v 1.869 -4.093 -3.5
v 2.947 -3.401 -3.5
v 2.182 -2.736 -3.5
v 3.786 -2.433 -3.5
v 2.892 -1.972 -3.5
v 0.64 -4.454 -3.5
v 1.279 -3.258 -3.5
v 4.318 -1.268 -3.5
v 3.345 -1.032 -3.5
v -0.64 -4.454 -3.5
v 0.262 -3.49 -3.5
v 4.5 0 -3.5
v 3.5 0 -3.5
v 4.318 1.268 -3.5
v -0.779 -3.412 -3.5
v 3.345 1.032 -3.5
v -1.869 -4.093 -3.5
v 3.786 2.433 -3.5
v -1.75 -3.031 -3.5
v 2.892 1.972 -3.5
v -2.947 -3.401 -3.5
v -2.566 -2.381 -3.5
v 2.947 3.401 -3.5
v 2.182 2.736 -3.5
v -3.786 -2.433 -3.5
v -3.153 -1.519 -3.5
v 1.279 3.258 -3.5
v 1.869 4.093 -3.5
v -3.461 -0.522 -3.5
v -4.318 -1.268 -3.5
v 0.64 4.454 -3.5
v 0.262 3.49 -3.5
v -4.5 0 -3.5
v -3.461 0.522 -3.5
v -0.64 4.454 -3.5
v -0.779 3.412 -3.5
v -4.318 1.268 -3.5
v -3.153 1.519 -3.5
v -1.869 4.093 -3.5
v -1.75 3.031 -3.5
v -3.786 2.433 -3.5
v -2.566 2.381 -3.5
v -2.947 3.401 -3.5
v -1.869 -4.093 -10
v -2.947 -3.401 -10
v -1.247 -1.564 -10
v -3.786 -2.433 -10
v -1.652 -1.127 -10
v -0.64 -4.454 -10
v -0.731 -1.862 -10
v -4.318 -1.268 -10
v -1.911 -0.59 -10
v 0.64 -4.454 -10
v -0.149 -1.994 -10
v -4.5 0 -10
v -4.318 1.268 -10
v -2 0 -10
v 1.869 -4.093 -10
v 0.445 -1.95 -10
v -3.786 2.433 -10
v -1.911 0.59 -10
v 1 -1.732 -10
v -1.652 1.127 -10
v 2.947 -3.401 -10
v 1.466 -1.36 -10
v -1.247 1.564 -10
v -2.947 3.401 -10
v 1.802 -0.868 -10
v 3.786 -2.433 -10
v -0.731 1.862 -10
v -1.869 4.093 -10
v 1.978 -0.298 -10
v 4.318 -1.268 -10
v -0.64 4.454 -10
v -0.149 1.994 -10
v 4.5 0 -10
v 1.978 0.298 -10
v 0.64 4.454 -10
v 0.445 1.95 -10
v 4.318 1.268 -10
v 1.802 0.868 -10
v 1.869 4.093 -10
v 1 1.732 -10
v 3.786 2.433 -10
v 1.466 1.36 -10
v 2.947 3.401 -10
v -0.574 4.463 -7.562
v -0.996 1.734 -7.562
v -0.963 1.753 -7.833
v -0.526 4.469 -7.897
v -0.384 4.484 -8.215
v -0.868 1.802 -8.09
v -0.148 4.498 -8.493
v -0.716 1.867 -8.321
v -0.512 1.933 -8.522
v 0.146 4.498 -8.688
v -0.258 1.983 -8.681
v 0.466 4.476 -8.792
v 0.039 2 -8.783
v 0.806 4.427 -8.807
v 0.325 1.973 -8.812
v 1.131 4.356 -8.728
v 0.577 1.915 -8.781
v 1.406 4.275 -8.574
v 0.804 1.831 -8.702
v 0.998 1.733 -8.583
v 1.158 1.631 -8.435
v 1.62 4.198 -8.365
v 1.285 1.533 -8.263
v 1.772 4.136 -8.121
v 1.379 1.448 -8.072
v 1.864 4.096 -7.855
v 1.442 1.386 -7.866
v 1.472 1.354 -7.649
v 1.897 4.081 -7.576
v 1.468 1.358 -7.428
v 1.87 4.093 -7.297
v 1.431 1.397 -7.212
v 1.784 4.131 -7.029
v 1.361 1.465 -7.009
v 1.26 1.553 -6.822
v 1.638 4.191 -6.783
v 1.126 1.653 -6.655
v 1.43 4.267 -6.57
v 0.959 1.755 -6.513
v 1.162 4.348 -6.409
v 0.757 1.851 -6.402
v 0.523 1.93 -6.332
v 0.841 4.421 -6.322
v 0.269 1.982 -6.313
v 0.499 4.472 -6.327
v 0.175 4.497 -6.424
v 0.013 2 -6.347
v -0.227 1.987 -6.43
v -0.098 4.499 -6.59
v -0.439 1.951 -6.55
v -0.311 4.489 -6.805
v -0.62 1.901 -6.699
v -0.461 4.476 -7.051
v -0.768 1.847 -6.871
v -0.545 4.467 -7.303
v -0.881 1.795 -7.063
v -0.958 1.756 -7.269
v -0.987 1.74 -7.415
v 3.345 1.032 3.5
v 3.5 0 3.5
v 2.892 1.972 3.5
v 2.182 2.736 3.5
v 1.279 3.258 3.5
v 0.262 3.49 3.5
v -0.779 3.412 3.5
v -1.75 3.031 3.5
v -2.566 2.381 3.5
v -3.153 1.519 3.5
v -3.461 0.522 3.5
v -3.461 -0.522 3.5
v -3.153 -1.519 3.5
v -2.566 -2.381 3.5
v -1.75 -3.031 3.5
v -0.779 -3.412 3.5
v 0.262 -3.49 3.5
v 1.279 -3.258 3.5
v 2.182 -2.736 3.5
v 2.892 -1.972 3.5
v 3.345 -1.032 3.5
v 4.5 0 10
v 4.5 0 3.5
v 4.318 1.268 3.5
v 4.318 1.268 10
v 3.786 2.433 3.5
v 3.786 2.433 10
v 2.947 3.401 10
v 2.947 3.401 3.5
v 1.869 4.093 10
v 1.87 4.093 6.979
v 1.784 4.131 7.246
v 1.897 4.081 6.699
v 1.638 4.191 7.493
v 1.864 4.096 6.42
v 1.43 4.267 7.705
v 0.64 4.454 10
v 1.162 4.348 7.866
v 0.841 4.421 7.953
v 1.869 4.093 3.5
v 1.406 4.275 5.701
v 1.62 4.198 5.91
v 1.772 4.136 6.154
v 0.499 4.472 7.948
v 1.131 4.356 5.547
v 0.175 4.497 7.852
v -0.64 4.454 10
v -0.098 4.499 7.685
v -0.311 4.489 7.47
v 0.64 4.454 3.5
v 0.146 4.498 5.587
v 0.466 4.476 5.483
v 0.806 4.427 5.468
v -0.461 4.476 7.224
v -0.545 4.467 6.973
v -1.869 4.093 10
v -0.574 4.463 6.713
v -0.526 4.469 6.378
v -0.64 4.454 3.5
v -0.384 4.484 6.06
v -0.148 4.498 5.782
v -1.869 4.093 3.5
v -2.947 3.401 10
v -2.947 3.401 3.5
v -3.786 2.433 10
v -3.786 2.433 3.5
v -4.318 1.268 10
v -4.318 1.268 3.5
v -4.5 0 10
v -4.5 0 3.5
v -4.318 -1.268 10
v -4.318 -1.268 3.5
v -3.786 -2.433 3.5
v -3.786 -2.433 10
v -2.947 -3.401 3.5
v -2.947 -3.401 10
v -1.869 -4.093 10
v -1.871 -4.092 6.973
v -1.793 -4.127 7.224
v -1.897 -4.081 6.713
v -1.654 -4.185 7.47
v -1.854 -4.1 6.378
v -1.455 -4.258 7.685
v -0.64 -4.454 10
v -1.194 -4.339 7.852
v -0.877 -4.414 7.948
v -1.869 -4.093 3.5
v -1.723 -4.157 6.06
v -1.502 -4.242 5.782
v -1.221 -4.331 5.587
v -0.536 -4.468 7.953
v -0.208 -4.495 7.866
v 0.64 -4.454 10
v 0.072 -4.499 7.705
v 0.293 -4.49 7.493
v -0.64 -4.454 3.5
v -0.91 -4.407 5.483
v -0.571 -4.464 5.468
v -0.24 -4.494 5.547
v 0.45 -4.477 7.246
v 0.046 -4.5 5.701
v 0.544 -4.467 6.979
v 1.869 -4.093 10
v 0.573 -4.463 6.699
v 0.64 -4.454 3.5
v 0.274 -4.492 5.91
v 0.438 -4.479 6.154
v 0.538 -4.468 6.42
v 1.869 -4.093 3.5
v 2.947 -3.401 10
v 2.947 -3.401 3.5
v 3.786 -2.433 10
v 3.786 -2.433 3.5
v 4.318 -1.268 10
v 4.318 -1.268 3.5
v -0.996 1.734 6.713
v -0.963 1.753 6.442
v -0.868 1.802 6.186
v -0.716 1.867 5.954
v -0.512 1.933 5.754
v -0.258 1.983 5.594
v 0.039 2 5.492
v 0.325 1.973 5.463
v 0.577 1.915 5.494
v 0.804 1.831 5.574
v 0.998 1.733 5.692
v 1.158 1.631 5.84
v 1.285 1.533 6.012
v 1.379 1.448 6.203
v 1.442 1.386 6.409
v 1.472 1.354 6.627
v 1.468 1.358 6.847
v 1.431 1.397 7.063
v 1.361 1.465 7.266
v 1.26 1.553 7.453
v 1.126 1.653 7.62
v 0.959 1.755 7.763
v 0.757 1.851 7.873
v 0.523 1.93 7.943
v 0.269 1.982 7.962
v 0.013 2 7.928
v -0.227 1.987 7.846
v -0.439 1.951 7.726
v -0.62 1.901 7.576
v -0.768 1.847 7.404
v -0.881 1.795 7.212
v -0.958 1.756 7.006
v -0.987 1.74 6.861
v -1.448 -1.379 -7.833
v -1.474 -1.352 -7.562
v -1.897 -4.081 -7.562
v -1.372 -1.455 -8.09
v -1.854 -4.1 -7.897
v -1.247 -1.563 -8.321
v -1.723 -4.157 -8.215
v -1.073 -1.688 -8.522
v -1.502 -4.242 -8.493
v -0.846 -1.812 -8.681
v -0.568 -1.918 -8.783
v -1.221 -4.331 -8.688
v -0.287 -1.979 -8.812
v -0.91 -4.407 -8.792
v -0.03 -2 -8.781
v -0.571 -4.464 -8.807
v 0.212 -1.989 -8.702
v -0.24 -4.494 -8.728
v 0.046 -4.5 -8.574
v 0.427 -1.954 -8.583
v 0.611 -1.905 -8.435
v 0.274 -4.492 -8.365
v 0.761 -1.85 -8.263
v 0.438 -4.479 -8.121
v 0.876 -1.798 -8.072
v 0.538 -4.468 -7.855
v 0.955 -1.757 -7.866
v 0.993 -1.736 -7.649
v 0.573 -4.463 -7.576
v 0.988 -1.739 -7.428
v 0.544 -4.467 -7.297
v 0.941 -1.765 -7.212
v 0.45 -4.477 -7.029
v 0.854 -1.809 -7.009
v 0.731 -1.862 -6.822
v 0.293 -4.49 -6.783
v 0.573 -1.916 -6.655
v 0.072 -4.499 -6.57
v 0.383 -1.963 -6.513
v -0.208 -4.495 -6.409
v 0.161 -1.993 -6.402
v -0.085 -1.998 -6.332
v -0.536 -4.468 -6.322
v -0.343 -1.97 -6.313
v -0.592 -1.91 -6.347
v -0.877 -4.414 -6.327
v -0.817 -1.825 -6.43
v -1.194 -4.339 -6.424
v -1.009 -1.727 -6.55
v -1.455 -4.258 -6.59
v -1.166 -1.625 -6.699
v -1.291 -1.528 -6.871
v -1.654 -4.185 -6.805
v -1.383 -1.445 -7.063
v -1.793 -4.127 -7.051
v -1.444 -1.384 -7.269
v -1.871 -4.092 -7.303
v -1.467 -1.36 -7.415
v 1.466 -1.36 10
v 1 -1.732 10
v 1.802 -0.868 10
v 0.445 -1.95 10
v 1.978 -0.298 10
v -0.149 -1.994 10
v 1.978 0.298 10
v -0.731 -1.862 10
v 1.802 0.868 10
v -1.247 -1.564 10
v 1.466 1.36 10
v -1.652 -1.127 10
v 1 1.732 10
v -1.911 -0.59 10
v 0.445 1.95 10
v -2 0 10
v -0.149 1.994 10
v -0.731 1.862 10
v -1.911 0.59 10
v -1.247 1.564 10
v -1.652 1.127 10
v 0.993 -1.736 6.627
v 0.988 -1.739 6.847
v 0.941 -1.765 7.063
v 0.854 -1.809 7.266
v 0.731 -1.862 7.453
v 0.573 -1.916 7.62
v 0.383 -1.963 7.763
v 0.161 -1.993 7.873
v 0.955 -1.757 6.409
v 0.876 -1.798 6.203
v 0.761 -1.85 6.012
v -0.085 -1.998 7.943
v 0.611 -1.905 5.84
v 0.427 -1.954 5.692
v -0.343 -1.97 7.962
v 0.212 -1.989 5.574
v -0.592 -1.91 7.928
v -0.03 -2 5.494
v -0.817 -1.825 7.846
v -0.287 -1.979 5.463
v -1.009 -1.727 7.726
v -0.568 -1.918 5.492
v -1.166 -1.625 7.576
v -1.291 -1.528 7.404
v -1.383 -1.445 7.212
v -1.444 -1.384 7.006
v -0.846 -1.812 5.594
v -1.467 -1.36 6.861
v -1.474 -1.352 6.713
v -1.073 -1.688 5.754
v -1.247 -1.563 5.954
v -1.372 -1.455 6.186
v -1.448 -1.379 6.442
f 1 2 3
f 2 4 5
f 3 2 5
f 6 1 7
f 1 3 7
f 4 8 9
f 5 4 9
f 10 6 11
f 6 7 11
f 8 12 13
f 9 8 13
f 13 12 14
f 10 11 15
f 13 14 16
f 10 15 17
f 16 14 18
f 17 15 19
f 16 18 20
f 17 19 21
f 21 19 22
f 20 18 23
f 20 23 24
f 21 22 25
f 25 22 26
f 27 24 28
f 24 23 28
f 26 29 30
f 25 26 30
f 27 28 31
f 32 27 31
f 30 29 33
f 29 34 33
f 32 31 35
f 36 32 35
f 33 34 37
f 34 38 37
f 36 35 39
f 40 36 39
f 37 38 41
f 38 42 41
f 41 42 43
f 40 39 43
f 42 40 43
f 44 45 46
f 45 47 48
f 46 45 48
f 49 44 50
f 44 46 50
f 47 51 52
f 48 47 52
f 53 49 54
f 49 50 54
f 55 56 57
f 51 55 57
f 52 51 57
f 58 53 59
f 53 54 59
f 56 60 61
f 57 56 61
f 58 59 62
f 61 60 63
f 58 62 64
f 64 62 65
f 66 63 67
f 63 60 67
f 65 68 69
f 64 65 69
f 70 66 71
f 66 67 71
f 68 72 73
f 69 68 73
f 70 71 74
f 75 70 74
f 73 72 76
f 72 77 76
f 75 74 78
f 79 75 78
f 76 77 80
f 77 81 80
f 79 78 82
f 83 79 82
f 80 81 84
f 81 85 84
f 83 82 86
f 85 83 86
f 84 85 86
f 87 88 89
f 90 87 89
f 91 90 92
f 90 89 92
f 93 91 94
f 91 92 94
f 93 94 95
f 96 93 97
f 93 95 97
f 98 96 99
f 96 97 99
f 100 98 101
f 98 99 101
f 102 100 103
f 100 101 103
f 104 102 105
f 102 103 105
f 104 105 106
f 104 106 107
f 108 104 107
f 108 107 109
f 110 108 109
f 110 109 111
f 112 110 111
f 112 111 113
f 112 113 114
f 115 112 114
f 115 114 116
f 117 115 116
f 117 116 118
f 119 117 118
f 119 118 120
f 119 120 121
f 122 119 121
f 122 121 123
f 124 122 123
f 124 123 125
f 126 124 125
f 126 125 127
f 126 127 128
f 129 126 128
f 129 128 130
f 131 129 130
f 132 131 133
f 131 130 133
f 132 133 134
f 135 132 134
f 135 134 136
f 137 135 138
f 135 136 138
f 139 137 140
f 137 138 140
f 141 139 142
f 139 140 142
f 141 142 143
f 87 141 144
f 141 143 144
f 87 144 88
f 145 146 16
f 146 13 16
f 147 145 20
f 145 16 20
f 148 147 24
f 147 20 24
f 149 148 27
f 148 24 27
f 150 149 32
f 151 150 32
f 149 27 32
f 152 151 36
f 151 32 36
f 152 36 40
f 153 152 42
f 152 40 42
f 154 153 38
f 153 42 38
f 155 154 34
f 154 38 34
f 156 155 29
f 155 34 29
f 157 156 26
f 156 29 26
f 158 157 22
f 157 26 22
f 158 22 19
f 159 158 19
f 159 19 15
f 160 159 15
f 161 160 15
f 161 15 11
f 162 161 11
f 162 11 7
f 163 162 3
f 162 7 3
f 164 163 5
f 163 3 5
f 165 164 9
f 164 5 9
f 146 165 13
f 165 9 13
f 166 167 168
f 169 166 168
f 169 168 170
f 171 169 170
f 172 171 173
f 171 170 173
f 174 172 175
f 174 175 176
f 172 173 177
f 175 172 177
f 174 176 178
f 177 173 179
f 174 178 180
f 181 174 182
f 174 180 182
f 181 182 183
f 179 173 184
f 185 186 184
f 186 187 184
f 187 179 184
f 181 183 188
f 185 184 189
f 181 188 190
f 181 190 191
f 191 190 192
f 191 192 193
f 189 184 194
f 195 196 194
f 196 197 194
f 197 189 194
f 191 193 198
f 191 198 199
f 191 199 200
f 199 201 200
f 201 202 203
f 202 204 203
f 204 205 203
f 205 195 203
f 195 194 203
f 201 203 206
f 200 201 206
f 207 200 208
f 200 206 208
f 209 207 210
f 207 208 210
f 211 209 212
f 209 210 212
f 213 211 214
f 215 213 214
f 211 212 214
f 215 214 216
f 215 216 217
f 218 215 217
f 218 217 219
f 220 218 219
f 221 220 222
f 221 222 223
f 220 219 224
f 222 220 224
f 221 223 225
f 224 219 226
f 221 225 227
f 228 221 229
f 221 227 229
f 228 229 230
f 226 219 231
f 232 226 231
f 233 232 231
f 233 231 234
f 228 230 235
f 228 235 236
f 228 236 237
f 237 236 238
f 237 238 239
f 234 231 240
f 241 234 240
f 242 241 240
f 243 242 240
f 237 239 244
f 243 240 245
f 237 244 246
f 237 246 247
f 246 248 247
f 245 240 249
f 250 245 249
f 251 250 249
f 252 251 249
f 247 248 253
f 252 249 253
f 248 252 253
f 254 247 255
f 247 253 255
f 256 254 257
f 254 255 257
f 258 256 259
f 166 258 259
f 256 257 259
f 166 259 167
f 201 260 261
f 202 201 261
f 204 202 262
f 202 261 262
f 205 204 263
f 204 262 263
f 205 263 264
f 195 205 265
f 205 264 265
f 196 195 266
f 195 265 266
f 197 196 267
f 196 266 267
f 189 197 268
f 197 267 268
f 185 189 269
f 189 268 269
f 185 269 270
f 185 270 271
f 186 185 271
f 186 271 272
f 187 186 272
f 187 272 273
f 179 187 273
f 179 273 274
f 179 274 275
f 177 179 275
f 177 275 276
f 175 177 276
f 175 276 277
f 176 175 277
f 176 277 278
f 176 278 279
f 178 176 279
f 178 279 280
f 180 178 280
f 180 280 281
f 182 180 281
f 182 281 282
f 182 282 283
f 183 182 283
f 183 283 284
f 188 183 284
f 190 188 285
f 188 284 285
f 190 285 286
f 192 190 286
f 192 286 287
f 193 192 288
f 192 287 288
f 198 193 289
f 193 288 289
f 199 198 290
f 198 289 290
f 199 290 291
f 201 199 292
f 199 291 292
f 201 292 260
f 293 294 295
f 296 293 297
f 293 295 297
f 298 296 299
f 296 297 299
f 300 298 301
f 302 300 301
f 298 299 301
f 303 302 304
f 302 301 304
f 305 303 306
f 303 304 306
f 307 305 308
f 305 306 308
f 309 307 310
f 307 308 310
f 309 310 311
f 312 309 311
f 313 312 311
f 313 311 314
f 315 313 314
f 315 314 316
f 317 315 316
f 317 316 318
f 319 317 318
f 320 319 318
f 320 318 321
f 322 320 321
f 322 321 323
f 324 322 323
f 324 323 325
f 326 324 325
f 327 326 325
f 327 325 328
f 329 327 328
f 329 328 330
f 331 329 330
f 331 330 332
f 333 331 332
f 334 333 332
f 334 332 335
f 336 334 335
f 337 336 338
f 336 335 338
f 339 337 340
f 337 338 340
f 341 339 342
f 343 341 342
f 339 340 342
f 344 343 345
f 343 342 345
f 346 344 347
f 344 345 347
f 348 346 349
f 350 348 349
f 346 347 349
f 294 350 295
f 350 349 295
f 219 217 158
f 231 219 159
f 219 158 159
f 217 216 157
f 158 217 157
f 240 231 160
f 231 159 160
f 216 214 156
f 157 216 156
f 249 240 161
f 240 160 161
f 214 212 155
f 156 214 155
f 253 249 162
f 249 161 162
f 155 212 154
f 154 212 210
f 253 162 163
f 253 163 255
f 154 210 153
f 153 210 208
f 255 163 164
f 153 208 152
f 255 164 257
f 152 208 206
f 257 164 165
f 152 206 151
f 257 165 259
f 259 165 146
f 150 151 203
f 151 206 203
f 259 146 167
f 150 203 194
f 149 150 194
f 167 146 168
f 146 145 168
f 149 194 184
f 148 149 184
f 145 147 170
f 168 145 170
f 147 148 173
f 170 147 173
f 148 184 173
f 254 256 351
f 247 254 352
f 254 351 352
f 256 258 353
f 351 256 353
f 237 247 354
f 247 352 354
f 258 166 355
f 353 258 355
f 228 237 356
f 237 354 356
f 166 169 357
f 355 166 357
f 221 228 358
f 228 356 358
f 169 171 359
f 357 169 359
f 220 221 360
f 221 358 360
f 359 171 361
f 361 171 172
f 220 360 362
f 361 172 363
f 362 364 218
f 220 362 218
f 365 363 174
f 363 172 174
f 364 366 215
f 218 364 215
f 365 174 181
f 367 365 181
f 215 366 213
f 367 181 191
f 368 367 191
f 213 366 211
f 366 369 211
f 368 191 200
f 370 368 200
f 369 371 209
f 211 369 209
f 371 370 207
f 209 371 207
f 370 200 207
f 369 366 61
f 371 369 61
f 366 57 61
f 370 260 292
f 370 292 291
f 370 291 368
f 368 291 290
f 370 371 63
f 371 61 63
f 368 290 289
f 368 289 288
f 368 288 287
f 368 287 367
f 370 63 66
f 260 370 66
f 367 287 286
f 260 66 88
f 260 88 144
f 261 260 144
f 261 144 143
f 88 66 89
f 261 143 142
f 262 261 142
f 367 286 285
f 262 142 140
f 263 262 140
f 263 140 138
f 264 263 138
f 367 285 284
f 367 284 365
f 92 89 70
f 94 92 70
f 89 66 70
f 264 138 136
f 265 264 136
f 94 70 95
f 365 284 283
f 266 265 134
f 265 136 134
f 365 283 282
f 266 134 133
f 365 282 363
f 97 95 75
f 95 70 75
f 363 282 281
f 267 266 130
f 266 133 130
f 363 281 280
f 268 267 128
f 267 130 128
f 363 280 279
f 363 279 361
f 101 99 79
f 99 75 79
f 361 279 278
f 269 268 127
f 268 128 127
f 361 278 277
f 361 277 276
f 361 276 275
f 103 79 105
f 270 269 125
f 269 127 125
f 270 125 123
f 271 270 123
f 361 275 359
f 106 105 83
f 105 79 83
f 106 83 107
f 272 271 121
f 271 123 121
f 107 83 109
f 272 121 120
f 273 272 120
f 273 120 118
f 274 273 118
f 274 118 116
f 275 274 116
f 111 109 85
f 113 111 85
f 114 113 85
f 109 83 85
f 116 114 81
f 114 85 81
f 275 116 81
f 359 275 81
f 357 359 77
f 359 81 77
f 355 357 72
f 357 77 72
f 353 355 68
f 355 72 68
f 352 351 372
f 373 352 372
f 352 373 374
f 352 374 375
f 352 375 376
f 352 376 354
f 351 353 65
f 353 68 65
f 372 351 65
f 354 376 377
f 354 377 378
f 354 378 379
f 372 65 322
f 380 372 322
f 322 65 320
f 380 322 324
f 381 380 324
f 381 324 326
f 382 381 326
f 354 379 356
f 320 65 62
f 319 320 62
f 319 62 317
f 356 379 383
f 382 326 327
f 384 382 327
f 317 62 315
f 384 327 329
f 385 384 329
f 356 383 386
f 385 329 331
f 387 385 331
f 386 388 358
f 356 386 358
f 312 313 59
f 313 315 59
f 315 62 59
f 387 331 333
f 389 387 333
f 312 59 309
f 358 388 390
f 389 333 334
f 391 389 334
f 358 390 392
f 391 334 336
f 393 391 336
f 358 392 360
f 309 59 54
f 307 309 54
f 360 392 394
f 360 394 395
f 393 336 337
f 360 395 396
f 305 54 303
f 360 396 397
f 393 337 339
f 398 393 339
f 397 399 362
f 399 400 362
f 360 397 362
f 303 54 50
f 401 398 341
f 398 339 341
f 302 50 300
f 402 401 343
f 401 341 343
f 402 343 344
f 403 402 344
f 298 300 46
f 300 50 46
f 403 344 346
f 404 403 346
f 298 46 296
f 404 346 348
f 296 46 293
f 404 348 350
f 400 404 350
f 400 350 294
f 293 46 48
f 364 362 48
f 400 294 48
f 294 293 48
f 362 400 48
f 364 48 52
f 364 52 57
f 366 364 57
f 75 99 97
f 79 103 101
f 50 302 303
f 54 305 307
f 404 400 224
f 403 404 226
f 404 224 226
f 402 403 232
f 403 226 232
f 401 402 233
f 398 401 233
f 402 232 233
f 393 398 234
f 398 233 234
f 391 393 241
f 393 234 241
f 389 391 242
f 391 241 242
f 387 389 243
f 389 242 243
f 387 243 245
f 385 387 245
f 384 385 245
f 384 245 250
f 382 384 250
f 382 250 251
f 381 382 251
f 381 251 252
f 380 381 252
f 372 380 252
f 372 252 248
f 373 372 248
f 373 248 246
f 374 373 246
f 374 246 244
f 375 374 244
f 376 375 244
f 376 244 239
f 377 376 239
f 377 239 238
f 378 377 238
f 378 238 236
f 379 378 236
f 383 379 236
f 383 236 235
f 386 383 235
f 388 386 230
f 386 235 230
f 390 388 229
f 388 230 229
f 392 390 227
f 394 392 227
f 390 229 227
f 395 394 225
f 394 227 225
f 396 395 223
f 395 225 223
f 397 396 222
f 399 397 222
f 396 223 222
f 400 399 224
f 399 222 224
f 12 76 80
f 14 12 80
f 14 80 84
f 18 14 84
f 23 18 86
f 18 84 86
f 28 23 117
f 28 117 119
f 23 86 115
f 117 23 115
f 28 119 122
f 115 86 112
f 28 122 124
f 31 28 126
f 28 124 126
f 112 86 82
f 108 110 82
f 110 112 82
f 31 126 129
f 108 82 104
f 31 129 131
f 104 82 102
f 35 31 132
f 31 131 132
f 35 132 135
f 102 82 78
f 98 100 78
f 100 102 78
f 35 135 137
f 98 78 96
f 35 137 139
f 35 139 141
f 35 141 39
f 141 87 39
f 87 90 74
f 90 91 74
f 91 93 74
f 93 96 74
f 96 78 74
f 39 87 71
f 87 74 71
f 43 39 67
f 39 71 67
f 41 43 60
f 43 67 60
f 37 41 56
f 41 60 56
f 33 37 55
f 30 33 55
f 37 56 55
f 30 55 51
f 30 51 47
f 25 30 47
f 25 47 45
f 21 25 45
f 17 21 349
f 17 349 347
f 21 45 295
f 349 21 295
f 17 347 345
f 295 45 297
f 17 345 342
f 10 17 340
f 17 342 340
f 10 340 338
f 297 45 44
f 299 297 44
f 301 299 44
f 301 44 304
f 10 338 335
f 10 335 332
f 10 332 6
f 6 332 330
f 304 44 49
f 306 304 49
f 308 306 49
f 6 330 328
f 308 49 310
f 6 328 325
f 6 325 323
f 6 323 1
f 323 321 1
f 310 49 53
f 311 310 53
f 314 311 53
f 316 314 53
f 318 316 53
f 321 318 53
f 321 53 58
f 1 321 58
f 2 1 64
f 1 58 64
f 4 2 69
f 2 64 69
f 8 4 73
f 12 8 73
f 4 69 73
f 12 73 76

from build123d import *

# Parameters (mm, degrees)
F_4_0MM_DOWEL_HOLE1_D           = 4
M3X0_5_TAPPED_HOLE1_D           = 2.5
M3X0_5_TAPPED_HOLE1_ON_FACE_2_D = 2.5


with BuildPart() as part:
    # Sketch1 → Revolve1 (revolve)
    with BuildSketch(Plane(origin=(0, 0, 0), x_dir=(1, 0, 0), z_dir=(0, 1, 0))):
        Polygon((4.5, 10), (0, 10), (0, -10), (4.5, -10), (4.5, -3.5), (3.5, -3.5), (3.5, 3.5), (4.5, 3.5), align=None)
    revolve(axis=Axis((0, 0, -10), (0, 0, 1)))

    # Ø4.0mm Dowel Hole1 (through all)
    with Locations(Plane.XY.offset(10)):
        with Locations((0, 0)):
            Hole(F_4_0MM_DOWEL_HOLE1_D / 2)

    # M3x0.5 Tapped Hole1 (through all)
    with Locations(Plane(origin=(0.688844658, 4.446964474, 6.712810899), x_dir=(0.988214328, -0.153076591, 0), z_dir=(0.153076591, 0.988214328, 0))):
        with Locations((0, 0)):
            Hole(M3X0_5_TAPPED_HOLE1_D / 2)

    # M3x0.5 Tapped Hole1 on face 2 (through all)
    with Locations(Plane(origin=(0.688844658, 4.446964474, -7.56241821), x_dir=(0.988214258, -0.15307704, 0), z_dir=(0.15307704, 0.988214258, 0))):
        with Locations((0, 0)):
            Hole(M3X0_5_TAPPED_HOLE1_ON_FACE_2_D / 2)


solid = part.part
